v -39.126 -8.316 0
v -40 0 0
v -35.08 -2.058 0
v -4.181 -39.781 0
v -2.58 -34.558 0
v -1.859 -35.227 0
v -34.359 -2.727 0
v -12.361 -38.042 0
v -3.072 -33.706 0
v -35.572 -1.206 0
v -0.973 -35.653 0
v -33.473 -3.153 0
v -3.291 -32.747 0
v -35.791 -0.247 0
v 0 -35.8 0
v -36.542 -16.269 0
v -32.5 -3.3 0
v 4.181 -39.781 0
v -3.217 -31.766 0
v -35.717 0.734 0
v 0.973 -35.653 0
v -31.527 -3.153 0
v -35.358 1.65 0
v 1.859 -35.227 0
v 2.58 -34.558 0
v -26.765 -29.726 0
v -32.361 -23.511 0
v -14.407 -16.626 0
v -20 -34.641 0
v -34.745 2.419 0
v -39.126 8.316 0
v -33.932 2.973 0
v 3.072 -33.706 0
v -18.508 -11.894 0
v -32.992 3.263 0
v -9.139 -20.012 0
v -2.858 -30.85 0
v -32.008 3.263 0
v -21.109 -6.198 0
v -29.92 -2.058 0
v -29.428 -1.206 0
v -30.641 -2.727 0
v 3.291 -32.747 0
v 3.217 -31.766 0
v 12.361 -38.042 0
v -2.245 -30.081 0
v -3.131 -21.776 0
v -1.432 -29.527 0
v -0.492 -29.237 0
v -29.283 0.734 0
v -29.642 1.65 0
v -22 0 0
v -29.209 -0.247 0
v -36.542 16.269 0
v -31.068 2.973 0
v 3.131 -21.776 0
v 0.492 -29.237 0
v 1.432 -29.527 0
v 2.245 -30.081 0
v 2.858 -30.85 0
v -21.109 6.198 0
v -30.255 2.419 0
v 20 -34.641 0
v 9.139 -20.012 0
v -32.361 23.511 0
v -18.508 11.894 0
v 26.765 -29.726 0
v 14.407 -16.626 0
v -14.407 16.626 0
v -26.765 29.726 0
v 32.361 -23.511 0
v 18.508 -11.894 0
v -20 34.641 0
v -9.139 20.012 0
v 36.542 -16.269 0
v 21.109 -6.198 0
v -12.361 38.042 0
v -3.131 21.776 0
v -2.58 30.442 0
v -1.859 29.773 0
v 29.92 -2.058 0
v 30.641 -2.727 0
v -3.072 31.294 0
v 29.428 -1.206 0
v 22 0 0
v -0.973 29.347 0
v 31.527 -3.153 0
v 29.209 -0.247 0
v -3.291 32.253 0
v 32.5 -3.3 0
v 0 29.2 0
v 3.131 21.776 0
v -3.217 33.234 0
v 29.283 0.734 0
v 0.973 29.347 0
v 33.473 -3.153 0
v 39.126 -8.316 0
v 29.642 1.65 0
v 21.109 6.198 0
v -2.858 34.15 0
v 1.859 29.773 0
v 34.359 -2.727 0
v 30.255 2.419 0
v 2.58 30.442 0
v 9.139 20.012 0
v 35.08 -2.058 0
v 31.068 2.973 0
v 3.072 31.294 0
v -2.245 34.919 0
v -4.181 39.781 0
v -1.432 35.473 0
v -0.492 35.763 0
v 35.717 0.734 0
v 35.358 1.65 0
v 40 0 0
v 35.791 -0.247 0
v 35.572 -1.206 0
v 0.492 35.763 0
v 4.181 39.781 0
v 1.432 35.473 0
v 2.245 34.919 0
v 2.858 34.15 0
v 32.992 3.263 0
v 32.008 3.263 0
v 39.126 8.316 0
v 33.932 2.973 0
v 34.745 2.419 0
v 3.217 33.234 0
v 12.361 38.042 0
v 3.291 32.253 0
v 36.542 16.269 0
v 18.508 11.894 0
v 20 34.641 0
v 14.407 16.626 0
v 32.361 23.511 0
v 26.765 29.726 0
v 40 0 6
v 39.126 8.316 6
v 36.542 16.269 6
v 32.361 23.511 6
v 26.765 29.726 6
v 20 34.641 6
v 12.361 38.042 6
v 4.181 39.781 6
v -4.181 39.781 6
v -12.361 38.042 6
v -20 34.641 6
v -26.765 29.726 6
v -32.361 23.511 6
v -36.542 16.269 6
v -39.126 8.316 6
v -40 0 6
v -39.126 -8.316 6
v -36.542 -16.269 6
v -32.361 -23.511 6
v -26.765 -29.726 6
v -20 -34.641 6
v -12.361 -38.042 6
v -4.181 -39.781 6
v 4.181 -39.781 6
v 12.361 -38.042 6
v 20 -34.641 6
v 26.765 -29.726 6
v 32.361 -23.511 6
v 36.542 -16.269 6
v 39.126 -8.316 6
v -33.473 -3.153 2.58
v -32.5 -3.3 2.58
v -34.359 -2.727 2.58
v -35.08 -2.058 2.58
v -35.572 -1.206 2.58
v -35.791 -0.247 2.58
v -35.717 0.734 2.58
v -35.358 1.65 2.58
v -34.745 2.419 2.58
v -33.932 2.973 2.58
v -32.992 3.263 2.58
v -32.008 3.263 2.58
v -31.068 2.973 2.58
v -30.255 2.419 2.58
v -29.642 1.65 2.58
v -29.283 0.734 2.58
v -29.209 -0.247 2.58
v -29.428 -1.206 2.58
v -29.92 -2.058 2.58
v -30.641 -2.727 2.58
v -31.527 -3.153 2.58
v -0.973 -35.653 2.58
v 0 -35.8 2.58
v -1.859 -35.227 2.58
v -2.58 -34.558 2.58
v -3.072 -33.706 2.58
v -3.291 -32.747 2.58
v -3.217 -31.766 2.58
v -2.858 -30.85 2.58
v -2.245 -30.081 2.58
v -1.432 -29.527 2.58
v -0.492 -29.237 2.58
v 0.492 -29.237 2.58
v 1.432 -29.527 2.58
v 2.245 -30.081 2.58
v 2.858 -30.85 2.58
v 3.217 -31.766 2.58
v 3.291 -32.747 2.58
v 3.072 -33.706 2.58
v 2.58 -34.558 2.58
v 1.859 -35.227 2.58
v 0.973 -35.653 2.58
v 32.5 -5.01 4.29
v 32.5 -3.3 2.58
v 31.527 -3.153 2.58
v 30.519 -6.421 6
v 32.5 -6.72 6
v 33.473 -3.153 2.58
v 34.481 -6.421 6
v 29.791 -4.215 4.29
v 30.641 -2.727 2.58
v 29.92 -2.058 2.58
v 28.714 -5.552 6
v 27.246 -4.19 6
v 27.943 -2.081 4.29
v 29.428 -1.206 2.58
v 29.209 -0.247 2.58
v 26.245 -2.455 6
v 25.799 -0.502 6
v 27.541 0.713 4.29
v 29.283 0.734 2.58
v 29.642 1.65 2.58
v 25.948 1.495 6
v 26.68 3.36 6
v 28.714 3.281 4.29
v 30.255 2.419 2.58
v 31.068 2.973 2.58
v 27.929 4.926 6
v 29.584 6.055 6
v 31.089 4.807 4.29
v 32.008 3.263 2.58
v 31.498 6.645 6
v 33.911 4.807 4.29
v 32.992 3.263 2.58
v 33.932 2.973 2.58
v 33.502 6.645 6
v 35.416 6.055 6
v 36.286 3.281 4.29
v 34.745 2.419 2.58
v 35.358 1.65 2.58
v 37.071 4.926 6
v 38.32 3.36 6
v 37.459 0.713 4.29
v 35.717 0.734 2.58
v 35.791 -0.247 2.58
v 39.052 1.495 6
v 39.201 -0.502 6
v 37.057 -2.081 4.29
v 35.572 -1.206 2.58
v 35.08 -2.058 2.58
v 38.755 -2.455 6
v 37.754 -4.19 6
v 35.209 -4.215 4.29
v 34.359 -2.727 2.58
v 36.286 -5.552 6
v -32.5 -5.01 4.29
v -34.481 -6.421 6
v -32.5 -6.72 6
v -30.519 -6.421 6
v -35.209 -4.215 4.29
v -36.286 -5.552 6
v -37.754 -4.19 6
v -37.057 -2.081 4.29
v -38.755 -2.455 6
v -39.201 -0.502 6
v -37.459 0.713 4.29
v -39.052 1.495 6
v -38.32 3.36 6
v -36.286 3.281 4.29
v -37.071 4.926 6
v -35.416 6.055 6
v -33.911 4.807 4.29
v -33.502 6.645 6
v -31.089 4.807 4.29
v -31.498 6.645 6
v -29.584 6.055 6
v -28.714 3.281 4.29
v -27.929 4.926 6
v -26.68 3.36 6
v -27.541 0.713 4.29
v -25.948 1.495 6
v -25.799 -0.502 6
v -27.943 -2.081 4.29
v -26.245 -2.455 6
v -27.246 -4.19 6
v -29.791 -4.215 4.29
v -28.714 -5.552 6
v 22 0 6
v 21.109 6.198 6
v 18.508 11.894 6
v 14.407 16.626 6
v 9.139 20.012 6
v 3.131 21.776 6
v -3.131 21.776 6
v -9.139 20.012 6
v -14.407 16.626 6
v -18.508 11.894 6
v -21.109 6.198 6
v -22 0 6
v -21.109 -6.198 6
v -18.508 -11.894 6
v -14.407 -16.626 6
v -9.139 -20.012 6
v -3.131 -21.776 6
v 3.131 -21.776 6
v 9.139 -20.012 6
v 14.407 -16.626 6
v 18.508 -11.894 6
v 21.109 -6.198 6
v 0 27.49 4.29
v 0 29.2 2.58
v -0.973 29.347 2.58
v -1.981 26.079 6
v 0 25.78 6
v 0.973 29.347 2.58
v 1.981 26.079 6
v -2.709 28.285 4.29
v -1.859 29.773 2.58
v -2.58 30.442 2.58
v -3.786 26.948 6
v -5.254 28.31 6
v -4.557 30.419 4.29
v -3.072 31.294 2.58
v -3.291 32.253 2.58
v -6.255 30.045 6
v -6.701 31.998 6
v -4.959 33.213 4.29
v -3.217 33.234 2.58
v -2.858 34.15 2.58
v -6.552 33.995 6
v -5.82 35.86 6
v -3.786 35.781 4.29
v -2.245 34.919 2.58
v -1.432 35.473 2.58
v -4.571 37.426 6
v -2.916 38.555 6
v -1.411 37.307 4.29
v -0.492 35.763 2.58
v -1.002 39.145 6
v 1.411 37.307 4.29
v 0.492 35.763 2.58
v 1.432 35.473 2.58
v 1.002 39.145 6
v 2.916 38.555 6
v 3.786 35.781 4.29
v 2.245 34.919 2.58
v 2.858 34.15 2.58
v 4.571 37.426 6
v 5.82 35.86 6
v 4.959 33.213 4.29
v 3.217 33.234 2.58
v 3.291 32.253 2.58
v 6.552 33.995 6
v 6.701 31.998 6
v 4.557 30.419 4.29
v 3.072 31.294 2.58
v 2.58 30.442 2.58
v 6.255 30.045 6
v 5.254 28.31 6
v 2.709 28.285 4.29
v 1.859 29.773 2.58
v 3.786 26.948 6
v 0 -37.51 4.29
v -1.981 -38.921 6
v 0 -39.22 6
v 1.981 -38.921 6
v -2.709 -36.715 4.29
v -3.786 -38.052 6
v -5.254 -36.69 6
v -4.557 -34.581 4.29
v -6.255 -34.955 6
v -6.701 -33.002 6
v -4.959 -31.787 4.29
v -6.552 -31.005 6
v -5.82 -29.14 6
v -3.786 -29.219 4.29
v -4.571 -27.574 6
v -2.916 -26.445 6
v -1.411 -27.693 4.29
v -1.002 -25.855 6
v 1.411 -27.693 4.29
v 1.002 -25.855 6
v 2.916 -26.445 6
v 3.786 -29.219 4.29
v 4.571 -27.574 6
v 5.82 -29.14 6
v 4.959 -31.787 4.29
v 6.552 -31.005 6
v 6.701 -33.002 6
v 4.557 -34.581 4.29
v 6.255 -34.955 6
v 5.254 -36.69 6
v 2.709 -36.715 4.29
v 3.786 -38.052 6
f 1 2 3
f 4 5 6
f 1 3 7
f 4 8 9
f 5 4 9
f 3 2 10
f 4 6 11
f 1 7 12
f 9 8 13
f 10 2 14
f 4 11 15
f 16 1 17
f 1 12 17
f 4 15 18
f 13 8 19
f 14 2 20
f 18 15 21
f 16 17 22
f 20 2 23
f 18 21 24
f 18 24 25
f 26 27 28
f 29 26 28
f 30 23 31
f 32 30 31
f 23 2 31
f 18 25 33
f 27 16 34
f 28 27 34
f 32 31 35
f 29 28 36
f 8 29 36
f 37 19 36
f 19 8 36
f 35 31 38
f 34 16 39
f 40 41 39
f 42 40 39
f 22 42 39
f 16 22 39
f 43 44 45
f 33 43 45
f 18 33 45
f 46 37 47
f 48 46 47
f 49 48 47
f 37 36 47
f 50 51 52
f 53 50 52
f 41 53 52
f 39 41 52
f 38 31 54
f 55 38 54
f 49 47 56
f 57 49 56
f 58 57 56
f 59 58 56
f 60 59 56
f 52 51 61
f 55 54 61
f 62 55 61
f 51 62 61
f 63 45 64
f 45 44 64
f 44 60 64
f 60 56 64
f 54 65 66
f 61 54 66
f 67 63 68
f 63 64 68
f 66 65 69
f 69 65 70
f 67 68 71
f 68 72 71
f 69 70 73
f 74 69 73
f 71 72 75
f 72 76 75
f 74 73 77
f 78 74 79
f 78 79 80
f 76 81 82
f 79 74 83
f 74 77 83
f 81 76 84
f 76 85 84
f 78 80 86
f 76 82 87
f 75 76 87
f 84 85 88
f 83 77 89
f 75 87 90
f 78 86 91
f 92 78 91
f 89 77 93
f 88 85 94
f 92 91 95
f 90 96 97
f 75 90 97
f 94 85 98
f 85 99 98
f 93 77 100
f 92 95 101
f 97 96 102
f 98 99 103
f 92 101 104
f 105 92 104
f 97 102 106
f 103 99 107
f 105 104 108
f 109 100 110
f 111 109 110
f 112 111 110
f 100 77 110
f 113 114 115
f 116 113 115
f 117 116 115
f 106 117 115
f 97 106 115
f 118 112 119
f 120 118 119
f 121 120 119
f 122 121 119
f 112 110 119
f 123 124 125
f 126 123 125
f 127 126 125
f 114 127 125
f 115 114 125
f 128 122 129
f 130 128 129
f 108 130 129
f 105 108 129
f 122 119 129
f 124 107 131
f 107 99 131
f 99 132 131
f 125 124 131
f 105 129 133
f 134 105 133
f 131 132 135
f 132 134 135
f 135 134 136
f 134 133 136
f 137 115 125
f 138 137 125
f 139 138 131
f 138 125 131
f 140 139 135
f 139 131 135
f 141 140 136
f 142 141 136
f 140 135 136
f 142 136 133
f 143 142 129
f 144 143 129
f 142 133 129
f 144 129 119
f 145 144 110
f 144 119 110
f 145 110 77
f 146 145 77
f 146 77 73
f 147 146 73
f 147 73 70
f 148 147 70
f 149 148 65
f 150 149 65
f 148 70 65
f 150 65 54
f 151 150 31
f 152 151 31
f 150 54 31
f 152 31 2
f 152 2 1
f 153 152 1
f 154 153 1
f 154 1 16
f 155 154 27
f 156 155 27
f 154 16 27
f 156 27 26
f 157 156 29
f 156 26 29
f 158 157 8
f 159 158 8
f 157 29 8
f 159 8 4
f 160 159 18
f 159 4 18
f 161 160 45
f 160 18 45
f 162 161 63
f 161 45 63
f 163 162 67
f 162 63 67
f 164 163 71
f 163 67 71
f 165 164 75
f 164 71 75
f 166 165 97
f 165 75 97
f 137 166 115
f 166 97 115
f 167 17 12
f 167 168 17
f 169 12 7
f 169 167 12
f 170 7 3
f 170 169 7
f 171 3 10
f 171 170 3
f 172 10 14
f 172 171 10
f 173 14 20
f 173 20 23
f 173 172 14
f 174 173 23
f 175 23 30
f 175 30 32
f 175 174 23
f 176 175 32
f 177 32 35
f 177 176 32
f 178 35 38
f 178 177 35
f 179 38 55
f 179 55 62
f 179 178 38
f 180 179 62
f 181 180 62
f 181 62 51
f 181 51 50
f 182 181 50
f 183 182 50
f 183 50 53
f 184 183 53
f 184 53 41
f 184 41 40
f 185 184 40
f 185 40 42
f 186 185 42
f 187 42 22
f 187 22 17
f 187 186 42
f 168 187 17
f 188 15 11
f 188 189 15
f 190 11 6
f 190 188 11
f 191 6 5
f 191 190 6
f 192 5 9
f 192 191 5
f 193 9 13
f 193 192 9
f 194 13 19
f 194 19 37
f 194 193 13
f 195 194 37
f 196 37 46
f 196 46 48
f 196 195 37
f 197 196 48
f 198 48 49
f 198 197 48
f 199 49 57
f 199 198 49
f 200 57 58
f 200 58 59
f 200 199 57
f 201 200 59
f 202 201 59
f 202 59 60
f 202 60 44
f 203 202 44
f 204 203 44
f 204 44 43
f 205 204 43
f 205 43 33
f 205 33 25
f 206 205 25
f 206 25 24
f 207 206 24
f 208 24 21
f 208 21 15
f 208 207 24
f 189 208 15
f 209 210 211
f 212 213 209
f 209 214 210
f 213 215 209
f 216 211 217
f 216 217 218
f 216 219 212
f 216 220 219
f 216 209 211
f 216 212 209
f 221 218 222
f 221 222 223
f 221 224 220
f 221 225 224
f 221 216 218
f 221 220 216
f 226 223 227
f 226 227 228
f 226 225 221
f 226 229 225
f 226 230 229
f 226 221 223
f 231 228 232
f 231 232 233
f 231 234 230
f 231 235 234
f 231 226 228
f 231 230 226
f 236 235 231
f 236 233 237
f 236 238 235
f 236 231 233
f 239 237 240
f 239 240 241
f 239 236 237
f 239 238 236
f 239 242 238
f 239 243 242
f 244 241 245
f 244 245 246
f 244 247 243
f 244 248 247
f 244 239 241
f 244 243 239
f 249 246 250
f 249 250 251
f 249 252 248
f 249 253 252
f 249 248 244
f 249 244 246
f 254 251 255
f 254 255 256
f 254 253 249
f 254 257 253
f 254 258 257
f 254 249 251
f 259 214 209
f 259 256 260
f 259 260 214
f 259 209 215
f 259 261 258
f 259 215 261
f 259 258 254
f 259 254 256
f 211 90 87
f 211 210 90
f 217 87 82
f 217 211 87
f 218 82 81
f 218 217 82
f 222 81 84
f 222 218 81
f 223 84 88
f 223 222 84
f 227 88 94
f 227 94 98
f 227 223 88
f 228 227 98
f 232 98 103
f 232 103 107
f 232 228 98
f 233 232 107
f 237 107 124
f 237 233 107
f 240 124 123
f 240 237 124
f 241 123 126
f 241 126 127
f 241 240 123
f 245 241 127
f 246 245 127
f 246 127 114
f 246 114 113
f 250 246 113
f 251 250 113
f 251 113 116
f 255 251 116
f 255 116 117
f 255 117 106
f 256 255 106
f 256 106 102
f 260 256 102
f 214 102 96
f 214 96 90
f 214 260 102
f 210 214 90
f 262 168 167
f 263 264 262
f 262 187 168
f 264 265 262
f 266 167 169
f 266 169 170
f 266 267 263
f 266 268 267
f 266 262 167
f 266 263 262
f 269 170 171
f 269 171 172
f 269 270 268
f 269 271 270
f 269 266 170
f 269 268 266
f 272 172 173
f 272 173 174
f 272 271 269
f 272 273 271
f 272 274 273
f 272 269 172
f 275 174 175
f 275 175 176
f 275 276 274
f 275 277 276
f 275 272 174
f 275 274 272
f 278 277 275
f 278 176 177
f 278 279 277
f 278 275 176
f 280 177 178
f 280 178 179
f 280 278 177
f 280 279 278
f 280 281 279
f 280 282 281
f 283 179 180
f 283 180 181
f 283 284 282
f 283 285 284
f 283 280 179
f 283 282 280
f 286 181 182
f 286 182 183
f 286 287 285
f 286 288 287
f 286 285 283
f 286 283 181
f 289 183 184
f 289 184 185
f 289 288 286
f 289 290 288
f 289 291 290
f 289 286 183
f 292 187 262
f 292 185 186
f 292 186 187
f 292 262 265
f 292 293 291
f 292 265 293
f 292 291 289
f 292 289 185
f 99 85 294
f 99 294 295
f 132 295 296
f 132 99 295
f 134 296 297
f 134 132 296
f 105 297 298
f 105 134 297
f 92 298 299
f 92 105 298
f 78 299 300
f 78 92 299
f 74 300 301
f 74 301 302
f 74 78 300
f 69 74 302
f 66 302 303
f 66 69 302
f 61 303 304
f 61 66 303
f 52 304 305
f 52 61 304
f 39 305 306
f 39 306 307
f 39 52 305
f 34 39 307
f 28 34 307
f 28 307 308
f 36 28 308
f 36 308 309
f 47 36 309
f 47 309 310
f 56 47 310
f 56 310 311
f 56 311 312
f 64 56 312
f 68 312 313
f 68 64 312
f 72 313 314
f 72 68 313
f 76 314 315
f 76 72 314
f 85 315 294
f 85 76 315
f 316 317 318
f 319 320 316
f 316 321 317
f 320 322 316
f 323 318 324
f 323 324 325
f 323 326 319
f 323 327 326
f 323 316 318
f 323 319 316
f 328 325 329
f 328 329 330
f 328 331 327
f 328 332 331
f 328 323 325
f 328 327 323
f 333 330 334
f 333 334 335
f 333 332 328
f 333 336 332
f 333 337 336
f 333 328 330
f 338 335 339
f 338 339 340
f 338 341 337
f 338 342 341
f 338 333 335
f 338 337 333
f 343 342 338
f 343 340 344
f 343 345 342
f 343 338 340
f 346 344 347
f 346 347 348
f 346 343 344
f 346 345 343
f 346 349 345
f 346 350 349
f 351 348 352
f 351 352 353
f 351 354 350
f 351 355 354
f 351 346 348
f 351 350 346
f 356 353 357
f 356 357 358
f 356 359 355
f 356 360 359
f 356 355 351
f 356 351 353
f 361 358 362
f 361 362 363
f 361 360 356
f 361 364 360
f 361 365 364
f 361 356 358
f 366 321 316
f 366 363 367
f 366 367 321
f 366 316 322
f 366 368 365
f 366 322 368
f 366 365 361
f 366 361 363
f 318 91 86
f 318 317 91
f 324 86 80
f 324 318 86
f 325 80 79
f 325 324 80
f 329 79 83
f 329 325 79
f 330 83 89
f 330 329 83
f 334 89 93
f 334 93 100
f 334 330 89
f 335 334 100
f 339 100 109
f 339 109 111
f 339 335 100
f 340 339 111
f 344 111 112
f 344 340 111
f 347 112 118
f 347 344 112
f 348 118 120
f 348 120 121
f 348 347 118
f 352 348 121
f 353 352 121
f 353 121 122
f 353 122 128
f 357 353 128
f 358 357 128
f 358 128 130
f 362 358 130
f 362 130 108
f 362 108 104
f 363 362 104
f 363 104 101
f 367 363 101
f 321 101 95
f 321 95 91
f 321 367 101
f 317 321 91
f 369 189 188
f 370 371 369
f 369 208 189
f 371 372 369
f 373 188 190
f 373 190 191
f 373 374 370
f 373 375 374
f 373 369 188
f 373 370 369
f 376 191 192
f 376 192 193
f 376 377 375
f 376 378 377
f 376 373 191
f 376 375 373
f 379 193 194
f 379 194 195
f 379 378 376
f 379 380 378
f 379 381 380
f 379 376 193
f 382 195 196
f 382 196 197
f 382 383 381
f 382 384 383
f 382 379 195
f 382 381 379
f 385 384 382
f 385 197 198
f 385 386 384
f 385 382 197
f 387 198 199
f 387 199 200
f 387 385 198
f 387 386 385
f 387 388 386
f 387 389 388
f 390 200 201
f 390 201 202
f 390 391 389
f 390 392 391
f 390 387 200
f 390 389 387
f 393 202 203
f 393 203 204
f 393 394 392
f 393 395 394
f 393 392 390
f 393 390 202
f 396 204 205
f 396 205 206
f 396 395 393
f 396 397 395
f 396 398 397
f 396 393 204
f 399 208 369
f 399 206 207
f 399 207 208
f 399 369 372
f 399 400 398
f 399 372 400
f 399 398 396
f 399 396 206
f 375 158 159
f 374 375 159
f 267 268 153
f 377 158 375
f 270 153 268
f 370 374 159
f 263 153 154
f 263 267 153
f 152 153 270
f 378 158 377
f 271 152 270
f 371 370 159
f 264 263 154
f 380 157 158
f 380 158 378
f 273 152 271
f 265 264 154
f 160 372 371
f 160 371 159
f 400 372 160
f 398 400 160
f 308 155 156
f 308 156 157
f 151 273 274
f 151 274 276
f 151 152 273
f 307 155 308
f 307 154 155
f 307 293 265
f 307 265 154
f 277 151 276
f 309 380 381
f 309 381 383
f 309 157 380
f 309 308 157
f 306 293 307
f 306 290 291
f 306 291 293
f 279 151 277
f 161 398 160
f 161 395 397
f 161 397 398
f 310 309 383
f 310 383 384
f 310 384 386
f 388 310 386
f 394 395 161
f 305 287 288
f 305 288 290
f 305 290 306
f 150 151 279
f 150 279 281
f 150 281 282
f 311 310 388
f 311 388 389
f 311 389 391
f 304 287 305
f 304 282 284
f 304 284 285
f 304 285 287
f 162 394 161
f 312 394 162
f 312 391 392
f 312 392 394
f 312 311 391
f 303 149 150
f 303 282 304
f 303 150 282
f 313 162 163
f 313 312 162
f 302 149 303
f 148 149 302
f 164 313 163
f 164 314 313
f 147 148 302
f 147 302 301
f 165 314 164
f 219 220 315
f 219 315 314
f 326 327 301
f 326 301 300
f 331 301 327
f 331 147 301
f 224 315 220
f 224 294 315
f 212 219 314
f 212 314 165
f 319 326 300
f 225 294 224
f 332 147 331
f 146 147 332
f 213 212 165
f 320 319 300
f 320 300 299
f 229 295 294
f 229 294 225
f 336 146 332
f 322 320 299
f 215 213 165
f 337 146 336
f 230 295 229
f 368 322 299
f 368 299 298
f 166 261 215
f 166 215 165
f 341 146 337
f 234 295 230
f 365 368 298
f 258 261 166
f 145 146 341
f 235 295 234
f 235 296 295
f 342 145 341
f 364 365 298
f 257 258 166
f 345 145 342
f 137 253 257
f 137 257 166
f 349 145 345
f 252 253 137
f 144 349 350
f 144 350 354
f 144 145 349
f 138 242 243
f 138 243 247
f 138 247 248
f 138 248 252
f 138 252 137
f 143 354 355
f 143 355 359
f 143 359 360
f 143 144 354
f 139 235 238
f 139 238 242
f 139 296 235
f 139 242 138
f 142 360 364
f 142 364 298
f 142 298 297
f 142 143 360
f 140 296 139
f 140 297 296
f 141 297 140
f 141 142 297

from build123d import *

# Parameters (mm, degrees)
SKETCH1_R                                    = 40
SKETCH1_R_2                                  = 22
BOSS_EXTRUDE1_DEPTH                          = 6
CSK_FOR_M5_COUNTERSUNK_FLAT_HEAD_SCR_2_COUNT = 2
CSK_FOR_M5_COUNTERSUNK_FLAT_HEAD_SCR_2_PITCH = 45.961940777
CSK_FOR_M5_COUNTERSUNK_FLAT_HEAD_SCR_3_COUNT = 2
CSK_FOR_M5_COUNTERSUNK_FLAT_HEAD_SCR_3_PITCH = 65
CSK_FOR_M5_COUNTERSUNK_FLAT_HEAD_SCR_4_COUNT = 2
CSK_FOR_M5_COUNTERSUNK_FLAT_HEAD_SCR_4_PITCH = 45.961940777


with BuildPart() as part:
    # Sketch1 → Boss-Extrude1 (new body)
    with BuildSketch(Plane.XY):
        Circle(SKETCH1_R)
        Circle(SKETCH1_R_2, mode=Mode.SUBTRACT)
    extrude(amount=BOSS_EXTRUDE1_DEPTH)

    # Sketch6 → CSK for M5 Countersunk Flat Head Screw1 (revolve, cut)
    with BuildSketch(Plane(origin=(0, 32.5, 6), x_dir=(0, -1, 0), z_dir=(1, 0, 0))):
        Polygon((0, 0), (0, 6), (3.3, 6), (3.3, 3.42), (6.72, 0), align=None)
    csk_for_m5_countersunk_flat_head_screw1 = revolve(axis=Axis((0, 32.5, 12.35), (0, 0, -1)), mode=Mode.SUBTRACT)

    # CSK for M5 Countersunk Flat Head Scr 2: CSK for M5 Countersunk Flat Head Screw1 ×2
    with Locations(*[Vector(-0.7071067811865476, -0.7071067811865476, 0) * (i * CSK_FOR_M5_COUNTERSUNK_FLAT_HEAD_SCR_2_PITCH) for i in range(1, CSK_FOR_M5_COUNTERSUNK_FLAT_HEAD_SCR_2_COUNT)]):
        add(csk_for_m5_countersunk_flat_head_screw1, mode=Mode.SUBTRACT)

    # CSK for M5 Countersunk Flat Head Scr 3: CSK for M5 Countersunk Flat Head Screw1 ×2
    with Locations(*[(0, -i * CSK_FOR_M5_COUNTERSUNK_FLAT_HEAD_SCR_3_PITCH, 0) for i in range(1, CSK_FOR_M5_COUNTERSUNK_FLAT_HEAD_SCR_3_COUNT)]):
        add(csk_for_m5_countersunk_flat_head_screw1, mode=Mode.SUBTRACT)

    # CSK for M5 Countersunk Flat Head Scr 4: CSK for M5 Countersunk Flat Head Screw1 ×2
    with Locations(*[Vector(0.7071067811865476, -0.7071067811865476, 0) * (i * CSK_FOR_M5_COUNTERSUNK_FLAT_HEAD_SCR_4_PITCH) for i in range(1, CSK_FOR_M5_COUNTERSUNK_FLAT_HEAD_SCR_4_COUNT)]):
        add(csk_for_m5_countersunk_flat_head_screw1, mode=Mode.SUBTRACT)


solid = part.part
